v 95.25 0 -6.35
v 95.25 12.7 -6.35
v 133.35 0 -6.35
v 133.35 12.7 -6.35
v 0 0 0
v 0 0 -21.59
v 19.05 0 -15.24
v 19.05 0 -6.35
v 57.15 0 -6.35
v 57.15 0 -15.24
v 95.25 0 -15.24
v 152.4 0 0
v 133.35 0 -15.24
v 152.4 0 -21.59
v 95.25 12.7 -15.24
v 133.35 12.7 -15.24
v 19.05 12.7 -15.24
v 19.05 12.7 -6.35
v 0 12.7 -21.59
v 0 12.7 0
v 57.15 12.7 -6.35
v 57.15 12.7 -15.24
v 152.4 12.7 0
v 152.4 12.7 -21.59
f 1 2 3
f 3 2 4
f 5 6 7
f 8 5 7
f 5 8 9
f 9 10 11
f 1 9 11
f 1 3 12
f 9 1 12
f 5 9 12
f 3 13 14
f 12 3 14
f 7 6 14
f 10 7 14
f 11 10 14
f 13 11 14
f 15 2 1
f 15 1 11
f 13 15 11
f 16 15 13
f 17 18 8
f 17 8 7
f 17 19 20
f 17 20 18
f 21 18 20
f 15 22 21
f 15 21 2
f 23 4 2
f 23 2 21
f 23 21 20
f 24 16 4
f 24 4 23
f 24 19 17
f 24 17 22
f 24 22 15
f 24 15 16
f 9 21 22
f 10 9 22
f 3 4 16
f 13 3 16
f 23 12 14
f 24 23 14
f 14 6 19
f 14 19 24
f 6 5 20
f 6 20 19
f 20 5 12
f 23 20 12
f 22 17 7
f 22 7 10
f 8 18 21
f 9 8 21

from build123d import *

# Parameters (mm, degrees)
SKETCH1_W               = 152.4
SKETCH1_H               = 21.59
BOSS_EXTRUDE1_DEPTH     = 12.7
SKETCH2_W               = 38.1
SKETCH2_H               = 8.89
CUT_EXTRUDE1_DEPTH      = 1
CUT_EXTRUDE1_DEPTH_BACK = 13.7


with BuildPart() as part:
    # Sketch1 → Boss-Extrude1 (new body)
    with BuildSketch(Plane(origin=(0, 0, 0), x_dir=(1, 0, 0), z_dir=(0, 1, 0))):
        with Locations((76.2, 10.795)):
            Rectangle(SKETCH1_W, SKETCH1_H)
    extrude(amount=BOSS_EXTRUDE1_DEPTH)

    # Sketch2 → Cut-Extrude1 (cut, two sides)
    with BuildSketch(Plane(origin=(0, 12.7, 0), x_dir=(1, 0, 0), z_dir=(0, 1, 0))) as cut_extrude1_sk:
        with Locations((38.1, 10.795)):
            Rectangle(SKETCH2_W, SKETCH2_H)
        with Locations((114.3, 10.795)):
            Rectangle(SKETCH2_W, SKETCH2_H)
    extrude(amount=CUT_EXTRUDE1_DEPTH, mode=Mode.SUBTRACT)
    extrude(cut_extrude1_sk.sketch, amount=-CUT_EXTRUDE1_DEPTH_BACK, mode=Mode.SUBTRACT)


solid = part.part
